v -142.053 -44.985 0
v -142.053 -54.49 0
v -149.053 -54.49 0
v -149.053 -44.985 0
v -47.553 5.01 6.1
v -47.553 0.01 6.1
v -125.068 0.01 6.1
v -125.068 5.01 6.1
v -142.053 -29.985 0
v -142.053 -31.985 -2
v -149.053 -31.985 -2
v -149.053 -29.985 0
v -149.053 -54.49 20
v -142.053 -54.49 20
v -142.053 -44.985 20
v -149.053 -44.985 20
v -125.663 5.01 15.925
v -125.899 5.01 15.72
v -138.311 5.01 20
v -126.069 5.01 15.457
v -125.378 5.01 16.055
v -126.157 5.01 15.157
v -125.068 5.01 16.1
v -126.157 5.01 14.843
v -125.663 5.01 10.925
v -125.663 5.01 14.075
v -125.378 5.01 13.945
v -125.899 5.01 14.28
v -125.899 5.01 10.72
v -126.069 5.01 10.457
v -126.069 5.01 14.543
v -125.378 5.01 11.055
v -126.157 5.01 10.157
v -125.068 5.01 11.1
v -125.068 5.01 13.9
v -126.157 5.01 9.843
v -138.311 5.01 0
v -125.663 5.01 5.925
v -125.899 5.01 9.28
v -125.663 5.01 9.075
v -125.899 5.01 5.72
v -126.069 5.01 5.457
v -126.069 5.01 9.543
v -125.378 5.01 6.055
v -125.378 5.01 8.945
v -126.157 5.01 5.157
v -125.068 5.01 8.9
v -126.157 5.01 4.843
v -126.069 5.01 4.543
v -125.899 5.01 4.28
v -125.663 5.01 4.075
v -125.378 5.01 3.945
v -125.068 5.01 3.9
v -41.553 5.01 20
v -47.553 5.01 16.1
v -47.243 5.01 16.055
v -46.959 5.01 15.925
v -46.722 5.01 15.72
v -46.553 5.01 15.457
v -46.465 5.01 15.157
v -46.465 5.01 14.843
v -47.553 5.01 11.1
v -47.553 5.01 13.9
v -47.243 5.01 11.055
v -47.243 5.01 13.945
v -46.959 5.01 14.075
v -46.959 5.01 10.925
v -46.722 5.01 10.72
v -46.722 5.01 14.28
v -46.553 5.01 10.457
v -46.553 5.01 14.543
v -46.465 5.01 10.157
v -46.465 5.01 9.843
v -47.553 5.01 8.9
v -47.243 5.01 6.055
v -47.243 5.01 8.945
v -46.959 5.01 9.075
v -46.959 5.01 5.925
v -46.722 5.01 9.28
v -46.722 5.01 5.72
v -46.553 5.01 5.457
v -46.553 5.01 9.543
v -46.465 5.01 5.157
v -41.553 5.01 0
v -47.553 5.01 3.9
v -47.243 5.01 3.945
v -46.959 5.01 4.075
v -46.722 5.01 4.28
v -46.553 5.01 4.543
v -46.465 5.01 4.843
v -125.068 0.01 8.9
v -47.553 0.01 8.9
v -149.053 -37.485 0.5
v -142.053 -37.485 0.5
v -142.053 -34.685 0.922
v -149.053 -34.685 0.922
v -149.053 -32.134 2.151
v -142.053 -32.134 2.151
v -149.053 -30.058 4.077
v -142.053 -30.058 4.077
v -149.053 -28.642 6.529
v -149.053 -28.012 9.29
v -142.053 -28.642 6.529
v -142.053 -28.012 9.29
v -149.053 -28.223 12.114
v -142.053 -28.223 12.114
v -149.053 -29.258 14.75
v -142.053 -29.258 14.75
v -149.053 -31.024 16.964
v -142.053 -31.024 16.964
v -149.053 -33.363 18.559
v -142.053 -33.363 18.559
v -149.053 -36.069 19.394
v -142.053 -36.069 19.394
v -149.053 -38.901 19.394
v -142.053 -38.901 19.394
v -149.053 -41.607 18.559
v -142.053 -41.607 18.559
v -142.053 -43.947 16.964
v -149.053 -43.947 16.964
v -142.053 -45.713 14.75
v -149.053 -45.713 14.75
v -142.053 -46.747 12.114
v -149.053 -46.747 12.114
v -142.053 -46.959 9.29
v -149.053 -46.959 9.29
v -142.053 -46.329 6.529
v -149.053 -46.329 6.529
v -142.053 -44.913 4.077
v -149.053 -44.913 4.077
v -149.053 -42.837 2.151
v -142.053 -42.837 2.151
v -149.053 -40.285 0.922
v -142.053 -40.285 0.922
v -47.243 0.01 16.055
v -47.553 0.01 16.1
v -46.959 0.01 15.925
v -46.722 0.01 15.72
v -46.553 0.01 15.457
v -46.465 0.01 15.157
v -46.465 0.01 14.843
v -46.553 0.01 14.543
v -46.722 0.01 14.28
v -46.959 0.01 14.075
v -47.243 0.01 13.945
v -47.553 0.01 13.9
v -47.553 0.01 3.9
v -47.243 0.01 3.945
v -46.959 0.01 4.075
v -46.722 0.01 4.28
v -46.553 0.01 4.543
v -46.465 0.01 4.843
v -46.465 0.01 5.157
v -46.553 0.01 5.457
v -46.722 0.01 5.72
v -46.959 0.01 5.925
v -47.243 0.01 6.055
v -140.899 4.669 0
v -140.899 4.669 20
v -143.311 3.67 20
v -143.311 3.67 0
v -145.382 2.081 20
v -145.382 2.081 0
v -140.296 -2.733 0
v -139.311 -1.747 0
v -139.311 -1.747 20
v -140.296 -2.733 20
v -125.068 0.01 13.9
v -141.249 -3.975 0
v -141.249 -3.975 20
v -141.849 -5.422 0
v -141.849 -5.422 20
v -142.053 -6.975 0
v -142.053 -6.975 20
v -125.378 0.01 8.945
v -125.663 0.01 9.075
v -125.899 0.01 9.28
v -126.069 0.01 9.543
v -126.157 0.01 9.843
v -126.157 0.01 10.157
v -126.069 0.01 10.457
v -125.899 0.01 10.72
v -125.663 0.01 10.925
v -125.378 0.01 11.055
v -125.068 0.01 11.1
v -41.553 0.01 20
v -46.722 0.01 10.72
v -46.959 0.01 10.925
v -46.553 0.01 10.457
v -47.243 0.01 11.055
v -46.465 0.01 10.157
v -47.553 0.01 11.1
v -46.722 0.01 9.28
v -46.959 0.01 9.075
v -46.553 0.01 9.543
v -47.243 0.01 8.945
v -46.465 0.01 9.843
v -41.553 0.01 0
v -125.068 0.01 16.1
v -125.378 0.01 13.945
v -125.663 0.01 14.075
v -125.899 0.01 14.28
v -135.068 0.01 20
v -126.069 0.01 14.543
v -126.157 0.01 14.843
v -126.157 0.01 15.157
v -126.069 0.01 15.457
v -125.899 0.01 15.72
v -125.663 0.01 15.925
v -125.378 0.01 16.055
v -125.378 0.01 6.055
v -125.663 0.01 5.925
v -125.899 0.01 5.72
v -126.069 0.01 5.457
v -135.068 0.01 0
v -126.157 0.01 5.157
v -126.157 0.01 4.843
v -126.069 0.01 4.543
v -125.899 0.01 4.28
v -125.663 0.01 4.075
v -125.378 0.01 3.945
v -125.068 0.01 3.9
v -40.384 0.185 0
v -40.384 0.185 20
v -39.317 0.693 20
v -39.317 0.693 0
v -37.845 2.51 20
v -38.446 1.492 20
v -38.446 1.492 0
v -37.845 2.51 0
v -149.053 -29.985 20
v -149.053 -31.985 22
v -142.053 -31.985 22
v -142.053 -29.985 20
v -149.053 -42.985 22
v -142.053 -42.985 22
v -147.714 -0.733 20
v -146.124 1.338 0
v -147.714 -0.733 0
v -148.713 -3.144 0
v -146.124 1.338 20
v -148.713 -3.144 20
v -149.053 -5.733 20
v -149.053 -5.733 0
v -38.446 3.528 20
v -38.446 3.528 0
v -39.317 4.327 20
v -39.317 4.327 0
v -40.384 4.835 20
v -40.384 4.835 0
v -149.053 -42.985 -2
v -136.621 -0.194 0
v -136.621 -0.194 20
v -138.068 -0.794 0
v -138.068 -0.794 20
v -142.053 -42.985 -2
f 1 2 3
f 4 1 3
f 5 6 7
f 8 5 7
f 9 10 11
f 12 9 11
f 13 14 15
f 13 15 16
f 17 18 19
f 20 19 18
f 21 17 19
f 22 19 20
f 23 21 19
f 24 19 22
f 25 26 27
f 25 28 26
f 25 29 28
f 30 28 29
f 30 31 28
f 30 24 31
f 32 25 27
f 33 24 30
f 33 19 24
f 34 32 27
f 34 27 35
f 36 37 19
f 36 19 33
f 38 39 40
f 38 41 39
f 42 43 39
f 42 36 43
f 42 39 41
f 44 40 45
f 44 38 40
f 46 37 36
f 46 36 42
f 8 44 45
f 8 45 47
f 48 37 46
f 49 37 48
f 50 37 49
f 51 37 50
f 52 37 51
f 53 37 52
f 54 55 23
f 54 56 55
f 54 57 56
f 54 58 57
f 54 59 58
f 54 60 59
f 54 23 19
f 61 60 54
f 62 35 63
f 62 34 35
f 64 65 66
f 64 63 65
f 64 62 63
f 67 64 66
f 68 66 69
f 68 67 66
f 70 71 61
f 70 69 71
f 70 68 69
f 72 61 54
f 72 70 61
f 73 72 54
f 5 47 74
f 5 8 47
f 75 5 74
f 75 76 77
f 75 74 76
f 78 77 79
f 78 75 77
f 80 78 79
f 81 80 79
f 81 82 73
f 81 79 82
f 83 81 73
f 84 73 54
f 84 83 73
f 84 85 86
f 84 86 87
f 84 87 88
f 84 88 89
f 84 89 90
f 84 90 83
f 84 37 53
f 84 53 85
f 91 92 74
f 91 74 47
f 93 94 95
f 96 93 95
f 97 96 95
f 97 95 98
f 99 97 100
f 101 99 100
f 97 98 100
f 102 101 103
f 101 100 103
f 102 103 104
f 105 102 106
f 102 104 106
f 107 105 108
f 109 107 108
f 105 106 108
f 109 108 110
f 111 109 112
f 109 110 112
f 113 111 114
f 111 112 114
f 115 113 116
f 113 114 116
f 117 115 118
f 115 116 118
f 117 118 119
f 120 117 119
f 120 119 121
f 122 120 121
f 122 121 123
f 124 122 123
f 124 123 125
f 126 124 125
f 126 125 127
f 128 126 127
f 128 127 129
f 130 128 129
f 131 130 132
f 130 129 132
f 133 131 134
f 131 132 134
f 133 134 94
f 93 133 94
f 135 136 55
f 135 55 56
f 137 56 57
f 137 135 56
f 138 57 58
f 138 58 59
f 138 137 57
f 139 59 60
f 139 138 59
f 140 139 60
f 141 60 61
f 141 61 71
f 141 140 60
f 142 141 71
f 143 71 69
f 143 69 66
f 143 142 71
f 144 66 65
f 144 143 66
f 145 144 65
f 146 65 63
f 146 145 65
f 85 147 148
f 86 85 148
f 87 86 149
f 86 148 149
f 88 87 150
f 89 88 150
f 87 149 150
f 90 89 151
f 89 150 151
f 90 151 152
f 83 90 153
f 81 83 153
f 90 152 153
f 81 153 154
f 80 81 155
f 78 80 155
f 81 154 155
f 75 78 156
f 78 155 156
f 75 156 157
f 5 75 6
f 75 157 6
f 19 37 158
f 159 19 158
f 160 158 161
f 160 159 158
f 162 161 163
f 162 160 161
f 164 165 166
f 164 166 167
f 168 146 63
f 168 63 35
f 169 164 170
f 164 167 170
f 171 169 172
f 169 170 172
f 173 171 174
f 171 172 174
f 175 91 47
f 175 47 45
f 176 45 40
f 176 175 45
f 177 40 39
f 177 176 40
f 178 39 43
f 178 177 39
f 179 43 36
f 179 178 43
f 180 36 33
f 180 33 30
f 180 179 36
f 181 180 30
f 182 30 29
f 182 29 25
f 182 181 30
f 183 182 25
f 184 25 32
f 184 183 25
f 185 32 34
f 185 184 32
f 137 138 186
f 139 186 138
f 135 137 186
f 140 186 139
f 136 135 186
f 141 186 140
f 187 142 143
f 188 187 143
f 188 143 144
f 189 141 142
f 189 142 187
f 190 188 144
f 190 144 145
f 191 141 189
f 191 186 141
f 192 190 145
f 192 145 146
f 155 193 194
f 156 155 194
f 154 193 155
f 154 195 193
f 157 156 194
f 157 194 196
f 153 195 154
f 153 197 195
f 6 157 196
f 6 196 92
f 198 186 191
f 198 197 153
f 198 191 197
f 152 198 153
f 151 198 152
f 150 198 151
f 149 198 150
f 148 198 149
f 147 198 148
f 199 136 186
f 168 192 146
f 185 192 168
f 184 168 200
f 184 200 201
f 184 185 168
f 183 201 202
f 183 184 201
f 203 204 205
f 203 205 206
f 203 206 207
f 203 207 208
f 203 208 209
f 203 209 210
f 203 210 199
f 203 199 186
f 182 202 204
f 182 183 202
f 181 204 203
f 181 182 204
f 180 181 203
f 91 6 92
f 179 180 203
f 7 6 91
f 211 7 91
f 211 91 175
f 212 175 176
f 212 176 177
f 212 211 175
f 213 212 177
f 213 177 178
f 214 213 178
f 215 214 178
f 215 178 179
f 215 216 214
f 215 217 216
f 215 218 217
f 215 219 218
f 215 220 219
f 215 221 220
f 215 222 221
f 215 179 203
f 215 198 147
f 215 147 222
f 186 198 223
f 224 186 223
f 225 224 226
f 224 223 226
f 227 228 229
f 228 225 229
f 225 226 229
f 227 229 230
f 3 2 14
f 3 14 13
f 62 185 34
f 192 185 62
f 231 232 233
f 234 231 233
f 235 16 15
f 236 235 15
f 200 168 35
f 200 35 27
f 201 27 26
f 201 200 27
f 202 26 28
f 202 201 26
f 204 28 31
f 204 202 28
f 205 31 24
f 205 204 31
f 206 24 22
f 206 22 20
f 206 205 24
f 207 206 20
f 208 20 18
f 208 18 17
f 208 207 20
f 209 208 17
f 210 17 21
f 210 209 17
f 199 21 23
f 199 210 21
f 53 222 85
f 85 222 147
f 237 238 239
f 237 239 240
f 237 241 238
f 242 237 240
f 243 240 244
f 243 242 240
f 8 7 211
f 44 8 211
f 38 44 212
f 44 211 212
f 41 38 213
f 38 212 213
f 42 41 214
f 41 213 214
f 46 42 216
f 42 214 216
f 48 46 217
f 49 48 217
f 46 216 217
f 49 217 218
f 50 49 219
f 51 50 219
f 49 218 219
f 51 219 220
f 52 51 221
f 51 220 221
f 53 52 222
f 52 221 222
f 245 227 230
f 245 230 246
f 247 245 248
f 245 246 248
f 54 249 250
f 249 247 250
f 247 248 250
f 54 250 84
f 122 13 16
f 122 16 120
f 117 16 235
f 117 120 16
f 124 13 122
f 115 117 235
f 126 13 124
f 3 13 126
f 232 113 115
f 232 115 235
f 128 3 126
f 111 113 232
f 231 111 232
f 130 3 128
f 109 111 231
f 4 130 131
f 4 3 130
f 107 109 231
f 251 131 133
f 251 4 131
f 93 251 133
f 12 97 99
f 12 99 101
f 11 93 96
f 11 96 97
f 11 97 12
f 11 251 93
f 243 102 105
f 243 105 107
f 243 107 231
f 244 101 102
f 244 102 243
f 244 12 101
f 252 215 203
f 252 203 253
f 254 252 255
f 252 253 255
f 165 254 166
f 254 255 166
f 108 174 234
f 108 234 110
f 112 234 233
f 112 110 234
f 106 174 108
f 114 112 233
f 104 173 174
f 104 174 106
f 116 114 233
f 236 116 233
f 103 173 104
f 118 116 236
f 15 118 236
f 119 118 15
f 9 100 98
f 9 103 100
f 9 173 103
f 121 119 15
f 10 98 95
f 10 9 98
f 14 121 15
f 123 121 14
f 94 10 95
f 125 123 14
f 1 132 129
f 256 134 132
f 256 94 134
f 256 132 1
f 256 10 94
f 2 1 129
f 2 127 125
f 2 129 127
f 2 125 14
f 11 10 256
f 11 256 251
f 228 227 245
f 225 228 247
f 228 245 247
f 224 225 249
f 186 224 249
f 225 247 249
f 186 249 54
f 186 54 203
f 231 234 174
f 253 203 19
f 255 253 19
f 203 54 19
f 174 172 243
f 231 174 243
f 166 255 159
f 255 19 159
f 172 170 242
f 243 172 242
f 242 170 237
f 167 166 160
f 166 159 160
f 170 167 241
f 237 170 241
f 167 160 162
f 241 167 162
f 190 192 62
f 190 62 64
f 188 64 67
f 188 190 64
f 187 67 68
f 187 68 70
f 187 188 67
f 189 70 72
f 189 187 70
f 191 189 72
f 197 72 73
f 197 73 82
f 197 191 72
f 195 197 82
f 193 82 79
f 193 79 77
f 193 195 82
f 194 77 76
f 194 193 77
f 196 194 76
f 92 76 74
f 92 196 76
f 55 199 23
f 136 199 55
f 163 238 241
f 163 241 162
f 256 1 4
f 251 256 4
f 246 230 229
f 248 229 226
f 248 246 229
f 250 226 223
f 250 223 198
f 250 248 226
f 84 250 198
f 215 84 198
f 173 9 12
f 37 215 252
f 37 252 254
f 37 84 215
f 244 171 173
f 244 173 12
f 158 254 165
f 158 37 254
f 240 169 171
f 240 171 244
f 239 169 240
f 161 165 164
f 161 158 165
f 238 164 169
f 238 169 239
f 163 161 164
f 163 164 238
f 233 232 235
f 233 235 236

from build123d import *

# Parameters (mm, degrees)
BOSS_EXTRUDE1_DEPTH = 20
FILLET1_R           = 6
SKETCH5_W           = 7
SKETCH5_H           = 15
BOSS_EXTRUDE3_DEPTH = 2
CUT_EXTRUDE1_DEPTH  = 5
SKETCH3_R           = 9.5
CUT_EXTRUDE2_DEPTH  = 7
SKETCH6_W           = 7
SKETCH6_H           = 15
BOSS_EXTRUDE4_DEPTH = 2
FILLET3_R           = 4
FILLET2_R           = 10
CHAMFER1_SIZE       = 2


# Some blends are built 0.0001 mm under size
with BuildPart() as part:
    # Sketch1 → Boss-Extrude1 (new body)
    with BuildSketch(Plane.XY):
        Polygon((-37.553334028, 5.009990716), (-37.553334028, 0.009990716), (-137.553334028, 0.009990716), (-142.053334028, -4.490009284), (-142.053334028, -54.490009284), (-149.053334028, -54.490009284), (-149.053334028, -1.590514347), (-142.452828965, 5.009990716), align=None)
    extrude(amount=BOSS_EXTRUDE1_DEPTH)

    # Fillet1
    fillet1_edges = [part.edges().sort_by_distance(p)[0] for p in [
        (-137.553334028, 0.009990716, 10),
        (-142.053334028, -4.490009284, 10),
    ]]
    fillet(fillet1_edges, radius=FILLET1_R)

    # Sketch5 → Boss-Extrude3 (add)
    with BuildSketch(Plane.XY.offset(20)):
        with Locations((-145.553334028, -37.485290658)):
            Rectangle(SKETCH5_W, SKETCH5_H)
    extrude(amount=BOSS_EXTRUDE3_DEPTH)

    # Sketch2 → Cut-Extrude1 (cut)
    with BuildSketch(Plane(origin=(0, 0.009990716, 0), x_dir=(-1, 0, 0), z_dir=(0, -1, 0))):
        with BuildLine():
            Line((125.068052654, -11.1), (47.553334028, -11.1))
            ThreePointArc((47.553334028, -11.1), (46.453334028, -10), (47.553334028, -8.9))
            Line((47.553334028, -8.9), (125.068052654, -8.9))
            ThreePointArc((125.068052654, -8.9), (126.168052654, -10), (125.068052654, -11.1))
        make_face()
        with BuildLine():
            Line((125.068052654, -3.9), (47.553334028, -3.9))
            ThreePointArc((47.553334028, -3.9), (46.453334028, -5), (47.553334028, -6.1))
            Line((47.553334028, -6.1), (125.068052654, -6.1))
            ThreePointArc((125.068052654, -6.1), (126.168052654, -5), (125.068052654, -3.9))
        make_face()
        with BuildLine():
            Line((125.068052654, -16.1), (47.553334028, -16.1))
            ThreePointArc((47.553334028, -16.1), (46.453334028, -15), (47.553334028, -13.9))
            Line((47.553334028, -13.9), (125.068052654, -13.9))
            ThreePointArc((125.068052654, -13.9), (126.168052654, -15), (125.068052654, -16.1))
        make_face()
    extrude(amount=-CUT_EXTRUDE1_DEPTH, mode=Mode.SUBTRACT)

    # Sketch3 → Cut-Extrude2 (cut)
    with BuildSketch(Plane(origin=(-142.053334028, 0, 0), x_dir=(0, 0, -1), z_dir=(1, 0, 0))):
        with Locations((-10, -37.485290658)):
            Circle(SKETCH3_R)
    extrude(amount=-CUT_EXTRUDE2_DEPTH, mode=Mode.SUBTRACT)

    # Sketch6 → Boss-Extrude4 (add)
    with BuildSketch(Plane(origin=(0, 0, 0), x_dir=(-1, 0, 0), z_dir=(0, 0, -1))):
        with Locations((145.553334028, -37.485290658)):
            Rectangle(SKETCH6_W, SKETCH6_H)
    extrude(amount=BOSS_EXTRUDE4_DEPTH)

    # Fillet3
    # the kernel refuses this fillet: 4 mm, written as the material it takes off along each edge
    with BuildSketch(Plane(origin=(-37.553334028, 5.009990716, -10), x_dir=(0, -1, 0), z_dir=(0, 0, 1)), Plane(origin=(-37.553334028, 0.009990716, -10), x_dir=(-1, 0, 0), z_dir=(0, 0, 1))) as fillet3_piece_1:
        with BuildLine():
            CenterArc((FILLET3_R, -FILLET3_R), FILLET3_R, 90, 90)
            Line((0, -FILLET3_R), (0, 0))
            Line((0, 0), (FILLET3_R, 0))
        make_face()
    extrude(amount=40, mode=Mode.SUBTRACT)

    # Fillet2
    fillet2_edges = [part.edges().sort_by_distance(p)[0] for p in [
        (-149.053334028, -1.590514347, 10),
        (-142.452828965, 5.009990716, 10),
    ]]
    fillet(fillet2_edges, radius=FILLET2_R)

    # Chamfer1
    chamfer1_edges = [part.edges().sort_by_distance(p)[0] for p in [
        (-145.553334028, -29.985290658, 22),
        (-145.553334028, -44.985290658, 22),
        (-145.553334028, -29.985290658, -2),
        (-145.553334028, -44.985290658, -2),
    ]]
    chamfer(chamfer1_edges, length=CHAMFER1_SIZE - 0.0001)  # a hair under: the kernel refuses the full size


solid = part.part
